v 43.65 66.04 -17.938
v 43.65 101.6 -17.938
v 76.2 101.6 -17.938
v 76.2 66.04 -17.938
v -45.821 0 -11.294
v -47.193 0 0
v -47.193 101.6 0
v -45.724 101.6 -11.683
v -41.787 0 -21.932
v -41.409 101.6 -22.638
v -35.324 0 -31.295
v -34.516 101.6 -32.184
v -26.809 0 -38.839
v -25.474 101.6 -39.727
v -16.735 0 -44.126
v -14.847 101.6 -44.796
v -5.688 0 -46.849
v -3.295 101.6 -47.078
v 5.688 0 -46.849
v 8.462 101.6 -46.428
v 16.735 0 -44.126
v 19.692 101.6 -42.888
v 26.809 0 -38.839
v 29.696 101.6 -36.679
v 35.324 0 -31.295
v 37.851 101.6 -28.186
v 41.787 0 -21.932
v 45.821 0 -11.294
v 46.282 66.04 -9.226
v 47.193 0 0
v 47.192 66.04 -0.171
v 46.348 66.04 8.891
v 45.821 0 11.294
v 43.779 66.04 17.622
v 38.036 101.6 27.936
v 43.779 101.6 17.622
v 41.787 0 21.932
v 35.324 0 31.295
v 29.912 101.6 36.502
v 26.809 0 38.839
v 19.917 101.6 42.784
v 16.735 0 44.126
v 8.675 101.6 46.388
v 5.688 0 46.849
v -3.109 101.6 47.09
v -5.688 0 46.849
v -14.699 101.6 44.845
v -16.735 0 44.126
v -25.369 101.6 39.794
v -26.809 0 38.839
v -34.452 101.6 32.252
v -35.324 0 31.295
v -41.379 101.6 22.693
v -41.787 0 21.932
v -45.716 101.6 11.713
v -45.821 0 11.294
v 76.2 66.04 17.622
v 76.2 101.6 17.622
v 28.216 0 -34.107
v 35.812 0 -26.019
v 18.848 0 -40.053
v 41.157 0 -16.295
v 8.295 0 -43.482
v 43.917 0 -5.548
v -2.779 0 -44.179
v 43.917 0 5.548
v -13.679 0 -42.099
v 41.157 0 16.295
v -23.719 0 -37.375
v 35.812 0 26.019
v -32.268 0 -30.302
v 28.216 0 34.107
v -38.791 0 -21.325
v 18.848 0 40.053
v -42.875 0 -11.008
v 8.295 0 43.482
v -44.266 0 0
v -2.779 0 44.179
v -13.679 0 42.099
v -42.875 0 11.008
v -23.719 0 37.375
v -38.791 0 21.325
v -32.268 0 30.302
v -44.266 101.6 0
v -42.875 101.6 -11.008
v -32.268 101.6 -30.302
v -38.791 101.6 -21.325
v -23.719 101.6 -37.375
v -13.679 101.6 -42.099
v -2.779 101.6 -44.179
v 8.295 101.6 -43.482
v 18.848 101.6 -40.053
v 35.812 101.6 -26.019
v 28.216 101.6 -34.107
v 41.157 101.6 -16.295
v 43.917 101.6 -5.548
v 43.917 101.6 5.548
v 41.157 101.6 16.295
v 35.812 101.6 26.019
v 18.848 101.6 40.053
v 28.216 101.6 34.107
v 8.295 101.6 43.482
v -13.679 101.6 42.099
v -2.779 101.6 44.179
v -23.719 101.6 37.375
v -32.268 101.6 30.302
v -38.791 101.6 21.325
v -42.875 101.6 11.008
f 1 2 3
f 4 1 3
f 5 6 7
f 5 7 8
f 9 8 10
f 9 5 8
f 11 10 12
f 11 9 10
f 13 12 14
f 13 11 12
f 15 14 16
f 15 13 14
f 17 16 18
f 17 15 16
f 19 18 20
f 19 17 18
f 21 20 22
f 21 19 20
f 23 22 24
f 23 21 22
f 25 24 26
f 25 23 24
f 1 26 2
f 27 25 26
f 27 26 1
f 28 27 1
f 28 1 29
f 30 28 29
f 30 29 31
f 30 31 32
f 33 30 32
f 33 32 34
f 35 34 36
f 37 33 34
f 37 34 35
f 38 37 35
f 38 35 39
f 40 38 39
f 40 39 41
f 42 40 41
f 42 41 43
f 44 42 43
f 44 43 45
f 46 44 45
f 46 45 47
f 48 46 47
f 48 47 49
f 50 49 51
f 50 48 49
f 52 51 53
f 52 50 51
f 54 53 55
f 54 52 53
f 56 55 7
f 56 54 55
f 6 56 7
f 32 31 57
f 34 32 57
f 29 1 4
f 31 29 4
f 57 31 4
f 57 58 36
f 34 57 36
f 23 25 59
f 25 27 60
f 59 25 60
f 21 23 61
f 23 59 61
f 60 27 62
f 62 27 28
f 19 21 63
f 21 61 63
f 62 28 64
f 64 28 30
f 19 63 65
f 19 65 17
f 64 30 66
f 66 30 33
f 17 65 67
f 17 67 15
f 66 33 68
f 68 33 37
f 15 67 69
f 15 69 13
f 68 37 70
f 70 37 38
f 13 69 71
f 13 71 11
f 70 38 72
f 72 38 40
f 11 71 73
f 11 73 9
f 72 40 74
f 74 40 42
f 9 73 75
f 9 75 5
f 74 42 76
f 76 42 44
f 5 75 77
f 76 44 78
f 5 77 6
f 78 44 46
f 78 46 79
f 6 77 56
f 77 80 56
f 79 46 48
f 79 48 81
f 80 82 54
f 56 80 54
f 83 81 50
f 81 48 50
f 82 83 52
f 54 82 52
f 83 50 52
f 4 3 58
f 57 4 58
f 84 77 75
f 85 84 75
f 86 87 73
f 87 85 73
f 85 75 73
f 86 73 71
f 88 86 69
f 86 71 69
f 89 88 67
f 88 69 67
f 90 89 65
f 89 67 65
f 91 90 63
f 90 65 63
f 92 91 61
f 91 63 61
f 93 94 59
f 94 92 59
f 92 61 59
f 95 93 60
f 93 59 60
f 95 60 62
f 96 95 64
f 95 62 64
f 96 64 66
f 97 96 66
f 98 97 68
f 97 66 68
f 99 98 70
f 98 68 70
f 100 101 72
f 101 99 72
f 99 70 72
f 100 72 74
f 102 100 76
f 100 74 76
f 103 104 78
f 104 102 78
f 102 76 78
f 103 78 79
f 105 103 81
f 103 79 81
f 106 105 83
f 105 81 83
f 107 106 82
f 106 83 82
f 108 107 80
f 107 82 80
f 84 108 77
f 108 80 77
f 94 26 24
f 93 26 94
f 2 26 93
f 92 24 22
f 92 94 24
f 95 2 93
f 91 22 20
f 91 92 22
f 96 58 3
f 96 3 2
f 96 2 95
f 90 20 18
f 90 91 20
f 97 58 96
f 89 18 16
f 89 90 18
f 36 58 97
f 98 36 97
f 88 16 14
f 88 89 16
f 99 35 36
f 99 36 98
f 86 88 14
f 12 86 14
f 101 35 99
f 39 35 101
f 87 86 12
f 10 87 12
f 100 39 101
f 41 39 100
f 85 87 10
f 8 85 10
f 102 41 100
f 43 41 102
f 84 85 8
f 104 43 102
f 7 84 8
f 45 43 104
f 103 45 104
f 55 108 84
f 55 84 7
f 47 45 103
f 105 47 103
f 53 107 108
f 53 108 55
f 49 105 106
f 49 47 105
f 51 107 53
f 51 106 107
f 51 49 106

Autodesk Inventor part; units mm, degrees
ref_plane "YZ Plane" through (0, 0, 0) normal (1, 0, 0) x (0, 1, 0)
ref_plane "XZ Plane" through (0, 0, 0) normal (0, 1, 0) x (-1, 0, 0)
ref_plane "XY Plane" through (0, 0, 0) normal (0, 0, 1) x (1, 0, 0)
sketch "Sketch13" plane through (0, 0, 0) normal (0, 1, 0) x (-1, 0, 0)
  circle A0 centre (0, 0) radius 44.2659
  circle A1 centre (0, 0) radius 47.1927
  dimension "d24" = 88.5317
extrude "Extrusion7" add sketch "Sketch13" along normal blind 101.6
sketch "Sketch14" plane through (0, 101.6, 0) normal (0, 1, 0) x (1, 0, 0)
  line L0 (43.6505, 17.9383) -> (76.2, 17.9383)
  line L1 (76.2, 17.9383) -> (76.2, -17.6217)
  line L2 (76.2, -17.6217) -> (43.7793, -17.6217)
  circle A0 centre (0, 0) radius 47.1927 projected
  arc A1 (43.7793, -17.6217) -> (43.6505, 17.9383) centre (0, 0) ccw
  dimension "d29" = 35.56
extrude "Extrusion8" add sketch "Sketch14" against normal blind 35.56 contours L0 L1 L2 A0
properties part number "cock storage holder" material "Stainless Steel"
